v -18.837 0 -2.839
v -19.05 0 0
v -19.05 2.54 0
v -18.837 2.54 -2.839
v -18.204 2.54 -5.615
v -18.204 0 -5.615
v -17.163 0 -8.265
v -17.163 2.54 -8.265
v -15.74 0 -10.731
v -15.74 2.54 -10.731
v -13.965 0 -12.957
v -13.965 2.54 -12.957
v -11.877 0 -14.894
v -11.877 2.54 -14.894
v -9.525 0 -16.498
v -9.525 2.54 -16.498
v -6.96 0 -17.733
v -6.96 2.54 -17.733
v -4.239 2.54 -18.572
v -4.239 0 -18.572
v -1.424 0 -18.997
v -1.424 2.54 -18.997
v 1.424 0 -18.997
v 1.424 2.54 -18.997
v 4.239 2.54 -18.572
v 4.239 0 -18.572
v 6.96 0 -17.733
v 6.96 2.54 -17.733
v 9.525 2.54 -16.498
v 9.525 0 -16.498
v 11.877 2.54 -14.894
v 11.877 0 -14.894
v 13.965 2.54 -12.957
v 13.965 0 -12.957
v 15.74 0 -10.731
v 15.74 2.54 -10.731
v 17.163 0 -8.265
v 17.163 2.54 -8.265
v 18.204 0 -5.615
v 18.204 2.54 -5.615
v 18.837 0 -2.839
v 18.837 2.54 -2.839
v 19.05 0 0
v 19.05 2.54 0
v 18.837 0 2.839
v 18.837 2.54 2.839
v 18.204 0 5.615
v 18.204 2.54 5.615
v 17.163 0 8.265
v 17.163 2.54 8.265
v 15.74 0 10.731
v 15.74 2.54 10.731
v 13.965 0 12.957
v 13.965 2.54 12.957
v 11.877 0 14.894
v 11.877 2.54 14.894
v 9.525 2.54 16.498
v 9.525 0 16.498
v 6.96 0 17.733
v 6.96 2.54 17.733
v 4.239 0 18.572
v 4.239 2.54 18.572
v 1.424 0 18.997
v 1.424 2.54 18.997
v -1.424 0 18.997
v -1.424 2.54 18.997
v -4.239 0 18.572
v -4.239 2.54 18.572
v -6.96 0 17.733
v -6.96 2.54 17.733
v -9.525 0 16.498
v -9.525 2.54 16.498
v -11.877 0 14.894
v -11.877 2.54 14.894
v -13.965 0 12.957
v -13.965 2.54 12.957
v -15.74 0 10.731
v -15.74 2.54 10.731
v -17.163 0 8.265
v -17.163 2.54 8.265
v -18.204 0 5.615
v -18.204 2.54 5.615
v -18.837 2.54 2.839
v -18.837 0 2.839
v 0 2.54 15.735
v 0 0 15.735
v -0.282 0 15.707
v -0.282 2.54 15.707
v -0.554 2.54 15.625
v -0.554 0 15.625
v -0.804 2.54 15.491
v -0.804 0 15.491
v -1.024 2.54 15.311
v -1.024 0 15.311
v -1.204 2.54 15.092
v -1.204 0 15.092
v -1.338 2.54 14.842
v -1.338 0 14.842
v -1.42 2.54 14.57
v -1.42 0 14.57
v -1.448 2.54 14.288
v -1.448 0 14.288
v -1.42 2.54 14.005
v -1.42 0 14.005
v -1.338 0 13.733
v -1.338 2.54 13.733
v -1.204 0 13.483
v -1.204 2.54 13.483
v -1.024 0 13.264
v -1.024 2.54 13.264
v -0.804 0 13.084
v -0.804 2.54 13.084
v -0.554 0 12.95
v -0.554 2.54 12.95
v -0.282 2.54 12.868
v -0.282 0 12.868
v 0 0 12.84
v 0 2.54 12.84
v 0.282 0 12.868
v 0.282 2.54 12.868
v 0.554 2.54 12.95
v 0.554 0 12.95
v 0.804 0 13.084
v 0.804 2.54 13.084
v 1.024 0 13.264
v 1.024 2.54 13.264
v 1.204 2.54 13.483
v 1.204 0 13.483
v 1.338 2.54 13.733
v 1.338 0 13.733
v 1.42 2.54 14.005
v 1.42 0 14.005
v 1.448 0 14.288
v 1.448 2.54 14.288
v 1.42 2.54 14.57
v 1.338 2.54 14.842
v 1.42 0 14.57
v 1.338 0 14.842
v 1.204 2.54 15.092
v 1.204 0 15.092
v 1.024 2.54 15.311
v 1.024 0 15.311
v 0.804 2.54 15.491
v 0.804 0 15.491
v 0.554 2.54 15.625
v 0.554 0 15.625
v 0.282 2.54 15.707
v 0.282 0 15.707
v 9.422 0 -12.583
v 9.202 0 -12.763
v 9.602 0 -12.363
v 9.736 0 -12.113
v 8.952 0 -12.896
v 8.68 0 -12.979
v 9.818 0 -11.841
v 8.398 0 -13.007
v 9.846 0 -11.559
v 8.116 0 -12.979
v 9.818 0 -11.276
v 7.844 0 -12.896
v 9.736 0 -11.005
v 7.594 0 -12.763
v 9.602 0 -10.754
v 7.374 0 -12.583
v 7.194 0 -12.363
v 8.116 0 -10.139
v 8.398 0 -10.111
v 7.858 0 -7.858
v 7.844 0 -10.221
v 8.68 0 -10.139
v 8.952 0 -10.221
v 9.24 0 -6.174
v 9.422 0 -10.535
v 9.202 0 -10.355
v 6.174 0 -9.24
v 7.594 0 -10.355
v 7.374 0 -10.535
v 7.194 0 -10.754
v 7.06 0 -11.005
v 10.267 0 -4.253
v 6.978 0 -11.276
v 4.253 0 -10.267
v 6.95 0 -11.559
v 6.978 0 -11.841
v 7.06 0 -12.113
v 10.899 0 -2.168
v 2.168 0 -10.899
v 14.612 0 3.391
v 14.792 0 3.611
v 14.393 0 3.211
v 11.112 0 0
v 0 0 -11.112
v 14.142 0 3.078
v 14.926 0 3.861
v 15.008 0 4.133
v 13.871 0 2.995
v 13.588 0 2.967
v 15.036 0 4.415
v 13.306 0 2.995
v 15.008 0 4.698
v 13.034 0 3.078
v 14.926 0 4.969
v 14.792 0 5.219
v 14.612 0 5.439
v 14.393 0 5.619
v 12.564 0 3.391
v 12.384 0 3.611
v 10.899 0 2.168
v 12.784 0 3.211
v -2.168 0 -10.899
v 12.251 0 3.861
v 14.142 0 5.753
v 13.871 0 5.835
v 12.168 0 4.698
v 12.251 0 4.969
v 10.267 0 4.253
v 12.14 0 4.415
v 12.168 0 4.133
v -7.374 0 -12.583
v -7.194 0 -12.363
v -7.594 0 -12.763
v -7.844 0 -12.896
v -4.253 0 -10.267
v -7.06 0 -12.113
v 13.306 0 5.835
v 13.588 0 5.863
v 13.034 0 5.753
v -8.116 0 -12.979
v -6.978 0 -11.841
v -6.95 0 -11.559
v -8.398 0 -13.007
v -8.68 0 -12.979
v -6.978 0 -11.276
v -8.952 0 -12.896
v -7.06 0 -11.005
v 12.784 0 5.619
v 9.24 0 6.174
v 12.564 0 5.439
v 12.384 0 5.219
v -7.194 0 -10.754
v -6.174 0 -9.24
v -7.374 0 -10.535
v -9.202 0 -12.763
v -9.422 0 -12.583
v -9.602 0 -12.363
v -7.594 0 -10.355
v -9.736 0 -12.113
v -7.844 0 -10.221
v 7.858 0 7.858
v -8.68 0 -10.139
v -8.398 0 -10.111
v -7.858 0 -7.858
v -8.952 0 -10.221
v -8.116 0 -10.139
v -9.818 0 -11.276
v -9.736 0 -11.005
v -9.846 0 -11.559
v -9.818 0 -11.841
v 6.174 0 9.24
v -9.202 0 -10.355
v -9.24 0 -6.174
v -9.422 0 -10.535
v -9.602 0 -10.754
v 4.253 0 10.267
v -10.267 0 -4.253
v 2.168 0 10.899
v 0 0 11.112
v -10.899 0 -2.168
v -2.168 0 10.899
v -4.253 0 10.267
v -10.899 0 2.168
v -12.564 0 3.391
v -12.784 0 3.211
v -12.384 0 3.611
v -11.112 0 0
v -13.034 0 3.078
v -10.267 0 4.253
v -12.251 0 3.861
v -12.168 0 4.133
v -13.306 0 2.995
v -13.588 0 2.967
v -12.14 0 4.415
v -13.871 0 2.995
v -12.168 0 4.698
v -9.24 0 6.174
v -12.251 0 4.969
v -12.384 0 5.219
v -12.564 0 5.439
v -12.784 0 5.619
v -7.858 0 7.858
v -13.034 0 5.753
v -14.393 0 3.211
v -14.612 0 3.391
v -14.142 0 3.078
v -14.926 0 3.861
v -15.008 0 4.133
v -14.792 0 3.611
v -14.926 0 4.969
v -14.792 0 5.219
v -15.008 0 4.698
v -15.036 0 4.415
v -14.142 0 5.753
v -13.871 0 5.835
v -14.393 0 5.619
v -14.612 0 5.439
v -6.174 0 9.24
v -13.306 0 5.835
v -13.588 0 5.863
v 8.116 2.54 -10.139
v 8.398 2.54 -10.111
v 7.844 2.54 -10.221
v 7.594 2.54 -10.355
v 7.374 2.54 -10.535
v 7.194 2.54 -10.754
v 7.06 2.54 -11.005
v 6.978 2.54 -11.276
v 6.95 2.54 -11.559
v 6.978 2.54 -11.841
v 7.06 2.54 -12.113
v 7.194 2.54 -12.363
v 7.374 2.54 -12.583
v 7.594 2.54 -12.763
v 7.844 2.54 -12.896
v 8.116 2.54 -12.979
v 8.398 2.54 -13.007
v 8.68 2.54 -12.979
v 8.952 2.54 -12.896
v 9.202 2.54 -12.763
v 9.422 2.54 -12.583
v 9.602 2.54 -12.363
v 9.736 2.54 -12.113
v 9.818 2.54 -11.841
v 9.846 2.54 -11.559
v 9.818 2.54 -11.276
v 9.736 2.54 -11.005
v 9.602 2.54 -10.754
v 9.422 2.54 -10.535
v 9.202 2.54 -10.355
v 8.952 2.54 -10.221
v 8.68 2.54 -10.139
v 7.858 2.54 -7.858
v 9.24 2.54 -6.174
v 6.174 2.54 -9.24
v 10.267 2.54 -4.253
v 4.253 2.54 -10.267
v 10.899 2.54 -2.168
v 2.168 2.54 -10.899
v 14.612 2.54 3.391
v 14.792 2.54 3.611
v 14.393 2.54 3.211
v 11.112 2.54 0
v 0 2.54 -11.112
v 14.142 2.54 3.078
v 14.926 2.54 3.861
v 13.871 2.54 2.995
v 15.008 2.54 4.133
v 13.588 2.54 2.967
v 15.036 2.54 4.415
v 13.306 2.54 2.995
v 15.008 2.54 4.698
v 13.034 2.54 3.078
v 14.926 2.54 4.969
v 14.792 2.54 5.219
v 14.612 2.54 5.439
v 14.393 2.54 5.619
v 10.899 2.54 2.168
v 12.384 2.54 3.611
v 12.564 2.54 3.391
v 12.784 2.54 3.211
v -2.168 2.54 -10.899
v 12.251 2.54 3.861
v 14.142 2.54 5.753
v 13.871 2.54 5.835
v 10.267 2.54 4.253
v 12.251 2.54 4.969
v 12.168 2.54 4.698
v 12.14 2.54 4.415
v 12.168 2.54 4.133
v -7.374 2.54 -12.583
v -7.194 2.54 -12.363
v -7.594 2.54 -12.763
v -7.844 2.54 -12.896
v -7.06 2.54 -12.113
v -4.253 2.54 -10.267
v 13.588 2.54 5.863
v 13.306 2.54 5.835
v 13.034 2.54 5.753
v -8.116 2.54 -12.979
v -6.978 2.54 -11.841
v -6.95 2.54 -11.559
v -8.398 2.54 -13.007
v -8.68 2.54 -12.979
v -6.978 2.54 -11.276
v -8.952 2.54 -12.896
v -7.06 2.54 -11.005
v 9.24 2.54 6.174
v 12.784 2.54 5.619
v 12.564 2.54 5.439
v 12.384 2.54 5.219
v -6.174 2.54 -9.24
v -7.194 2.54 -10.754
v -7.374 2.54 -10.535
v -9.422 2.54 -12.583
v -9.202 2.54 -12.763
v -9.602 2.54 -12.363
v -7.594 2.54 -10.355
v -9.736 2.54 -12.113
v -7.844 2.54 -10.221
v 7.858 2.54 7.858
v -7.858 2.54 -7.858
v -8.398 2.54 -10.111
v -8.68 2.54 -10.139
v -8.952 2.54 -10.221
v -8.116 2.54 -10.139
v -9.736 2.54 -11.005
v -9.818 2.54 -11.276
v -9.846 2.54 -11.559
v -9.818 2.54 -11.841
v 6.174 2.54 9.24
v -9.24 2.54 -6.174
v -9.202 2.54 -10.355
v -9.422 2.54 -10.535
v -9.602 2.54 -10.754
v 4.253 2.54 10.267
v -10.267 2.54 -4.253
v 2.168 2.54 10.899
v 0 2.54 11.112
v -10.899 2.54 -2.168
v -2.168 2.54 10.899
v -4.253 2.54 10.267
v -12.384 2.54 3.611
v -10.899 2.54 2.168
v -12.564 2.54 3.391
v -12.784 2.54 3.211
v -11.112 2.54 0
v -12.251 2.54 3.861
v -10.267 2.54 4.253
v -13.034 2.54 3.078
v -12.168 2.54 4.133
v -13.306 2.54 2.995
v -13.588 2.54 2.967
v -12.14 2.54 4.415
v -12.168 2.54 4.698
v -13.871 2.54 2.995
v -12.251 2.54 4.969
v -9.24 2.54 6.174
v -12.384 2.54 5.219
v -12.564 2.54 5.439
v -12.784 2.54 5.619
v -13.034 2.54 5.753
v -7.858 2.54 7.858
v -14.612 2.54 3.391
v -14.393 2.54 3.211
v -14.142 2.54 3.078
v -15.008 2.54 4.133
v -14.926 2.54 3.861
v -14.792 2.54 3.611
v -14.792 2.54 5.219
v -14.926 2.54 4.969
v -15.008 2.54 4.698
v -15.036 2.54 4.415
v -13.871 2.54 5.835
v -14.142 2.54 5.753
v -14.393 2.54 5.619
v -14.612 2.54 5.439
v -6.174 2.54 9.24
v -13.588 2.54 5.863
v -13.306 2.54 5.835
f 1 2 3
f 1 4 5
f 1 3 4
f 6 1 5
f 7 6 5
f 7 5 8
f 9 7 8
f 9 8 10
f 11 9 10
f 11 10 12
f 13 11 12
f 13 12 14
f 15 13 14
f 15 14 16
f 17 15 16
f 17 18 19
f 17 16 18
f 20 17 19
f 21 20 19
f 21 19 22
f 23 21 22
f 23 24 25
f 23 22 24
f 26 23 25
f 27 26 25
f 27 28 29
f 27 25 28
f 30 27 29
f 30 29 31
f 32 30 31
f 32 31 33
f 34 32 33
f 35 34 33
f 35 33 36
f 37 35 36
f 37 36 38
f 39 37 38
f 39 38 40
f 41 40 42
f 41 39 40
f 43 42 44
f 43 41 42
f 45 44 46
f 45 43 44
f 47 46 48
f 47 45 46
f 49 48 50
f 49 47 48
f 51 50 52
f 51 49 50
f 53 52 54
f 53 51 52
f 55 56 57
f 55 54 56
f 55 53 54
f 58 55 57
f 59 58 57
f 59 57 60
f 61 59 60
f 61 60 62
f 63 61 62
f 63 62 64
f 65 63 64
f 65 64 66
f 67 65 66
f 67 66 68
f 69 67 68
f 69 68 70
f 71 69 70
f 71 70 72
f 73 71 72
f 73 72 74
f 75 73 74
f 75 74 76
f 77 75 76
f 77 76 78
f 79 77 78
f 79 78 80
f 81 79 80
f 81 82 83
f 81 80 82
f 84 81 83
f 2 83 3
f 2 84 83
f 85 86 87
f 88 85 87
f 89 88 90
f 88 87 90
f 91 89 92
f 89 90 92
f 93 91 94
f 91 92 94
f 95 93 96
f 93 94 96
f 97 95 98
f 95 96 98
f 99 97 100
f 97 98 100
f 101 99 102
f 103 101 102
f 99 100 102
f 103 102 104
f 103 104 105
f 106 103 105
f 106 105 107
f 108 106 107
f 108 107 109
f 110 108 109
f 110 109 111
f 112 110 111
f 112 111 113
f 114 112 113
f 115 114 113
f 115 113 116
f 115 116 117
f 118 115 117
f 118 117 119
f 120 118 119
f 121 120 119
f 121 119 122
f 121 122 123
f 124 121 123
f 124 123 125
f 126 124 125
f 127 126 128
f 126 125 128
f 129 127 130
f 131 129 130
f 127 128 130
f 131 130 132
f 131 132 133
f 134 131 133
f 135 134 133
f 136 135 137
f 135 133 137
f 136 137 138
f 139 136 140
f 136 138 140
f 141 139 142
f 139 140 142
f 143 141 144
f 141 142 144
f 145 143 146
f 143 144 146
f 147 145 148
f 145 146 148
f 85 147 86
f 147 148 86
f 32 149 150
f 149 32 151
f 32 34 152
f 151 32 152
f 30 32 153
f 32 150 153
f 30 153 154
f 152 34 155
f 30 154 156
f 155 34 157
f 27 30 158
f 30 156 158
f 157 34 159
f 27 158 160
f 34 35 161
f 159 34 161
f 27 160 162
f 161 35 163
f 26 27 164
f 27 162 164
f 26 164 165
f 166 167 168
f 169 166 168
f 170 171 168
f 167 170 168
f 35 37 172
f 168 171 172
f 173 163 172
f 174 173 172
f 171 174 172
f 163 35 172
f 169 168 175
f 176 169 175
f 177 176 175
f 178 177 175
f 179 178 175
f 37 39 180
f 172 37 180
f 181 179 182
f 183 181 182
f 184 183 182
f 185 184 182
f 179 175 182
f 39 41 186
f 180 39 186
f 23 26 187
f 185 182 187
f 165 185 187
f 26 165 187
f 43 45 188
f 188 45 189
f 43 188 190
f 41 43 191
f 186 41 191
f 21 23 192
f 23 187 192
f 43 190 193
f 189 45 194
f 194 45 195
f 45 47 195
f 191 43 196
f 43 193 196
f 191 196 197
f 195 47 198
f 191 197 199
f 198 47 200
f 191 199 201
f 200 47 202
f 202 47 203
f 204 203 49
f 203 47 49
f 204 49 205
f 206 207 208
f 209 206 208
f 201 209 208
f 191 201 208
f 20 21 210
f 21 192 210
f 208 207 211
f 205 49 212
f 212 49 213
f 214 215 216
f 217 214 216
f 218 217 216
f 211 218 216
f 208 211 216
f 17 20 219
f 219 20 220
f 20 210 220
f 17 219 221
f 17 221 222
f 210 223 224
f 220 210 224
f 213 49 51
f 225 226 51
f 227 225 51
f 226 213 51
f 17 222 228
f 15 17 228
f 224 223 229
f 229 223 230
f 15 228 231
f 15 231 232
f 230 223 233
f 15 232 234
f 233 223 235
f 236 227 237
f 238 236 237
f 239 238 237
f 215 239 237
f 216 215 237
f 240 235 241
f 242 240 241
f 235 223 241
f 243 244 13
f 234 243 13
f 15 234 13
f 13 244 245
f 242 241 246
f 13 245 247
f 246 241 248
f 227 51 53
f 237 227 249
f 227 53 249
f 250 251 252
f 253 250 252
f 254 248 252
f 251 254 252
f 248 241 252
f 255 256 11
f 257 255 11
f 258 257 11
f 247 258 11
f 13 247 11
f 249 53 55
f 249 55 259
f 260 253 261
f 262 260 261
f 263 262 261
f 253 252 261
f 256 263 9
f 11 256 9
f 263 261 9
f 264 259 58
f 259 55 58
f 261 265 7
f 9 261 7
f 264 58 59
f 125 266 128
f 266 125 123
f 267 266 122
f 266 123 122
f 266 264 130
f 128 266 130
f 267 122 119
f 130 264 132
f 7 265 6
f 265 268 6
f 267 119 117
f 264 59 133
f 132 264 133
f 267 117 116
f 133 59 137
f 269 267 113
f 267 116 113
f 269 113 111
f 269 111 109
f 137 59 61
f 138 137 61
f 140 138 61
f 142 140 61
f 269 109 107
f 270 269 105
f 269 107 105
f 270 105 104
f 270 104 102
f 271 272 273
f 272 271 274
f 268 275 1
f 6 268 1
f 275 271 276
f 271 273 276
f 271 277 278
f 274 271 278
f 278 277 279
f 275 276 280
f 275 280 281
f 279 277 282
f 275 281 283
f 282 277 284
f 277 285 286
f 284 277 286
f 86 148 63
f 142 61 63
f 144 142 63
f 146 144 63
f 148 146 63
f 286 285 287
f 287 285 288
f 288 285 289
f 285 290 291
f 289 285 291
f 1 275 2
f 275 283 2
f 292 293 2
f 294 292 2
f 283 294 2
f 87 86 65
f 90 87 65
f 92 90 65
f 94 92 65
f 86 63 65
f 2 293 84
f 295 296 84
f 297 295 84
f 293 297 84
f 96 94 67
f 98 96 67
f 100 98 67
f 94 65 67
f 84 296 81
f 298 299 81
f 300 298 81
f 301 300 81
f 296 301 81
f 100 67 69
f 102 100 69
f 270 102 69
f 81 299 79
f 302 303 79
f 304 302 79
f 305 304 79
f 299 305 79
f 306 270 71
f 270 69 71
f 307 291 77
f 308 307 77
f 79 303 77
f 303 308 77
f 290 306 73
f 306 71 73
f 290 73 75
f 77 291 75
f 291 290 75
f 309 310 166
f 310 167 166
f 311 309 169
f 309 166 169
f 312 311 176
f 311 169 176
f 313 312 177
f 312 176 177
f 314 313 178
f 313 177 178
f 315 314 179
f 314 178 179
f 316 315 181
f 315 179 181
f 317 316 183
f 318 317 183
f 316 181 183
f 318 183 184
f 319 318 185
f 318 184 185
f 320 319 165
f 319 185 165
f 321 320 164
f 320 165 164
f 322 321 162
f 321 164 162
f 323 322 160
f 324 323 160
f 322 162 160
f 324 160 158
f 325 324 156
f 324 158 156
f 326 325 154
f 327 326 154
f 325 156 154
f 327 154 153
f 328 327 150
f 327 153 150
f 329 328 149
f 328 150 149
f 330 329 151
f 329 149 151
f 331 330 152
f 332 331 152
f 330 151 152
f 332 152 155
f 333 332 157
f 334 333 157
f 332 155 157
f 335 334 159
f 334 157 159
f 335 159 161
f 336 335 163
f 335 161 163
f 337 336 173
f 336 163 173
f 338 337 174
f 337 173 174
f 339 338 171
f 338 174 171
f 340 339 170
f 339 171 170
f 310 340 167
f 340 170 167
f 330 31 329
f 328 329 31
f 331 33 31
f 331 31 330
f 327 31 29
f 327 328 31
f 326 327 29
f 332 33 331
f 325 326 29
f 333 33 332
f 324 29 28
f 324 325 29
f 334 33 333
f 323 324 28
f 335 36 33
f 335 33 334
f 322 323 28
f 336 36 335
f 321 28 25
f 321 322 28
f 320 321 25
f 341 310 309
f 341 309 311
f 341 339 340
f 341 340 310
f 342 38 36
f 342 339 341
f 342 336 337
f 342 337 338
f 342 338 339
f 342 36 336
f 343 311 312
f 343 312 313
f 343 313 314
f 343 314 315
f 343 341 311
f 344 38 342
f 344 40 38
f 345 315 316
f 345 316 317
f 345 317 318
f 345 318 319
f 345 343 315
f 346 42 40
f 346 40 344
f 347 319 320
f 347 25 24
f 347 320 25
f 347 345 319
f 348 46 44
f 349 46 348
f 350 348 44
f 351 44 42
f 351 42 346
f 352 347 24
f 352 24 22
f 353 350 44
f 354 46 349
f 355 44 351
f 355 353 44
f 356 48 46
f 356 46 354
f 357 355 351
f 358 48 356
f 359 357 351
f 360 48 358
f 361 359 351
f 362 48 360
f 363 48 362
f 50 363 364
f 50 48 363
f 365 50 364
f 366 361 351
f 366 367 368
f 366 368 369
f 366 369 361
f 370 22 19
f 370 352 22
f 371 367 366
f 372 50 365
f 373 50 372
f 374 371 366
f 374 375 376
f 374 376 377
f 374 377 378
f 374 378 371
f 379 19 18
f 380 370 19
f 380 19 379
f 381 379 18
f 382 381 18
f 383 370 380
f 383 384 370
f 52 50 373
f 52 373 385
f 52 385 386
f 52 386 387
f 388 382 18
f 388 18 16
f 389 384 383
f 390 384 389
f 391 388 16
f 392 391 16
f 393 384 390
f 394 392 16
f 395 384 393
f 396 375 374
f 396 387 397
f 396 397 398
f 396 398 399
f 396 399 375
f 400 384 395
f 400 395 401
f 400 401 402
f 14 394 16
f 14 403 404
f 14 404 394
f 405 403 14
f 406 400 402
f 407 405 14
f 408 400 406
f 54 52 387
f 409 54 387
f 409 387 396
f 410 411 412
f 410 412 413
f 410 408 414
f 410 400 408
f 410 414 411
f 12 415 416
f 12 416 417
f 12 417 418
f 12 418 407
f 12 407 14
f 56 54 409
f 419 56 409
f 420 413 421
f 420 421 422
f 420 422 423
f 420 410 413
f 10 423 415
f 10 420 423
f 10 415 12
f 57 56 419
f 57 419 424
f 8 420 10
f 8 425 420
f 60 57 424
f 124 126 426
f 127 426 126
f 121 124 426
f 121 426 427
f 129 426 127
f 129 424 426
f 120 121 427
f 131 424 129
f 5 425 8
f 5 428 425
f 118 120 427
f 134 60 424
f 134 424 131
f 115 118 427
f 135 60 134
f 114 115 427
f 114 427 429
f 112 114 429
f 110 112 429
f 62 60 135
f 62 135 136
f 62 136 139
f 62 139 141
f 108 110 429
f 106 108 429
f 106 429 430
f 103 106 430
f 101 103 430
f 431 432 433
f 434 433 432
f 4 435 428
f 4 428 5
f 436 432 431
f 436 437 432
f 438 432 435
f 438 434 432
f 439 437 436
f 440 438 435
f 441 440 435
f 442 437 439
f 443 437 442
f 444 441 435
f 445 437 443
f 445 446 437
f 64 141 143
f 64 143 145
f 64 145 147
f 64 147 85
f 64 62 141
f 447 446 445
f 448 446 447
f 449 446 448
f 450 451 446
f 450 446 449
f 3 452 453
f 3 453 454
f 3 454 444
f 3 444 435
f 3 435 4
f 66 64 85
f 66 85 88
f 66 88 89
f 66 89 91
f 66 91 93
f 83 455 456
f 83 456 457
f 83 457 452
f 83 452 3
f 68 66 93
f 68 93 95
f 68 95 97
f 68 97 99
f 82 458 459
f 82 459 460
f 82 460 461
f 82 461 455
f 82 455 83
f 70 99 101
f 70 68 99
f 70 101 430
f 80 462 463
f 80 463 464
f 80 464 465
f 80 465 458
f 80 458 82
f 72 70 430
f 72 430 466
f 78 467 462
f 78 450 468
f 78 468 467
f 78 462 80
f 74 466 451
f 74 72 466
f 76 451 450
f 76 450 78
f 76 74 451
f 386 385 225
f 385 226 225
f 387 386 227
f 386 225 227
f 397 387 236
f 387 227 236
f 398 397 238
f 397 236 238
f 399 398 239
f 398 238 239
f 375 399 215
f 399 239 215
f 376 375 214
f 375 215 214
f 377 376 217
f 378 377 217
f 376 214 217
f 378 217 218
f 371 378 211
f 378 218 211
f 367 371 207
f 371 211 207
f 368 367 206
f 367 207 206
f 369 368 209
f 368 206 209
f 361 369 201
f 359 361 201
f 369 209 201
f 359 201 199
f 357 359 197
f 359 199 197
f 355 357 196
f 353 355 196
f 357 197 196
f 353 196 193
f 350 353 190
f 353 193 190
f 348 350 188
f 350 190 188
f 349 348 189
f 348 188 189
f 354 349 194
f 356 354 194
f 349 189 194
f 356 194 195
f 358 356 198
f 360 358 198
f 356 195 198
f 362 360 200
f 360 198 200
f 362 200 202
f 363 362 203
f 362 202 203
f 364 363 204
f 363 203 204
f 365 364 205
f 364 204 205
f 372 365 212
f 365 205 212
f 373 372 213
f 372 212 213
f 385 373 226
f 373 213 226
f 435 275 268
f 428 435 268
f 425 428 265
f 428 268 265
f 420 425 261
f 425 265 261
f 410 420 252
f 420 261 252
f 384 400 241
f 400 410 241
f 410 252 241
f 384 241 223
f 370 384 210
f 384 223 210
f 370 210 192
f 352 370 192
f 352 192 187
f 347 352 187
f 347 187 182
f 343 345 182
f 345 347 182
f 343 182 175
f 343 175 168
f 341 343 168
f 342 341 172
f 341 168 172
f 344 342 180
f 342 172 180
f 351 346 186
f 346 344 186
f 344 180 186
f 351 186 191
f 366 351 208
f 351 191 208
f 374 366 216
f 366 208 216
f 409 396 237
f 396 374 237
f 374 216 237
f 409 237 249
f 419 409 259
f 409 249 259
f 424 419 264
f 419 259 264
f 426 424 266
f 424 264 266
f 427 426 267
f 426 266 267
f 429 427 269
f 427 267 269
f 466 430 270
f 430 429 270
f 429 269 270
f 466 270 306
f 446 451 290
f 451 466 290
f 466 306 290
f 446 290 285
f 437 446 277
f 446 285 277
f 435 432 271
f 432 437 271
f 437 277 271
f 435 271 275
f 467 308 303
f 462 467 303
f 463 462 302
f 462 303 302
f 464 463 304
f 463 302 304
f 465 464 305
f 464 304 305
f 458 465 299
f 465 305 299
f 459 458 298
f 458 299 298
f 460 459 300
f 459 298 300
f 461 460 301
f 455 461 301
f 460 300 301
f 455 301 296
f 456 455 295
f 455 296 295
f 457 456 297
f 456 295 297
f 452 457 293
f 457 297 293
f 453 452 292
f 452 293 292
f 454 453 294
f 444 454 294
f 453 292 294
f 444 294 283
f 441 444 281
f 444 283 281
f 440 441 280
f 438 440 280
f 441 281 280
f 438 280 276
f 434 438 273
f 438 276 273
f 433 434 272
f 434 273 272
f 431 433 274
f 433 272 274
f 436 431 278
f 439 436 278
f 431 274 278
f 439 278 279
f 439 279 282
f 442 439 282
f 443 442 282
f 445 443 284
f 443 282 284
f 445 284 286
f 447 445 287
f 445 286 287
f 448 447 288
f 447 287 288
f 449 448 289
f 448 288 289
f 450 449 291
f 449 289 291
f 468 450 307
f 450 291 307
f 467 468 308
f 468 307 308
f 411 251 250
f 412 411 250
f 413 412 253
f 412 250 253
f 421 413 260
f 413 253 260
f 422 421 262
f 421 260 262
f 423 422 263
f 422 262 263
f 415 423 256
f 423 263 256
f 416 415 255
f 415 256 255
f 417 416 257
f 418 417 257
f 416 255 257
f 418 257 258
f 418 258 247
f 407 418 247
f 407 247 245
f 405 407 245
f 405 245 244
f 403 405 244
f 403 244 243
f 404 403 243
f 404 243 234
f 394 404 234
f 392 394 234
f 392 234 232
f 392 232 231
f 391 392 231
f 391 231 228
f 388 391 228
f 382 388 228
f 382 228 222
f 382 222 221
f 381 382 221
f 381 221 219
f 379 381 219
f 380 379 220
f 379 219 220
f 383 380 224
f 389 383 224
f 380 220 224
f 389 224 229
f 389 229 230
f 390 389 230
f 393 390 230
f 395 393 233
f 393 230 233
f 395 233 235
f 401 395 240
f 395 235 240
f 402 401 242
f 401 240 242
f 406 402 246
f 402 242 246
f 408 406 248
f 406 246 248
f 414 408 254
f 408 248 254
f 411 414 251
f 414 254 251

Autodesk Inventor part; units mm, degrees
ref_plane "YZ Plane" through (0, 0, 0) normal (1, 0, 0) x (0, 1, 0)
ref_plane "XZ Plane" through (0, 0, 0) normal (0, 1, 0) x (-1, 0, 0)
ref_plane "XY Plane" through (0, 0, 0) normal (0, 0, 1) x (1, 0, 0)
sketch "Sketch1" plane through (0, 0, 0) normal (0, 1, 0) x (-1, 0, 0)
  circle A0 centre (0, 0) radius 19.05
  circle A1 centre (0, 0) radius 11.1125
  dimension "d0" = 38.1
  dimension "d1" = 22.225
extrude "Extrusion1" add sketch "Sketch1" along normal blind 2.54
sketch "Sketch2" plane through (0, 2.54, 0) normal (0, 1, 0) x (1, 0, 0)
  line L0 (0, 0) -> (0, -14.2875)
  line L1 (0, -14.2875) -> (-13.5882, -4.4151)
  line L2 (-13.5882, -4.4151) -> (-8.398, 11.5588)
  line L3 (-8.398, 11.5588) -> (8.398, 11.5588)
  line L4 (8.398, 11.5588) -> (13.5882, -4.4151)
  line L5 (13.5882, -4.4151) -> (0, -14.2875)
  dimension "d4" = 14.2875
hole "Hole1" at (0, 2.54, 14.2875) at (-13.5882, 2.54, 4.4151) at (-8.398, 2.54, -11.5588) at (8.398, 2.54, -11.5588) at (13.5882, 2.54, 4.4151) direction (0, -1, 0) diameter 2.8956 end through all clearance for "Socket Head Cap Screw ISO 4762" size "M2.5" standard "ISO"
properties part number "wheel-drill-template"
